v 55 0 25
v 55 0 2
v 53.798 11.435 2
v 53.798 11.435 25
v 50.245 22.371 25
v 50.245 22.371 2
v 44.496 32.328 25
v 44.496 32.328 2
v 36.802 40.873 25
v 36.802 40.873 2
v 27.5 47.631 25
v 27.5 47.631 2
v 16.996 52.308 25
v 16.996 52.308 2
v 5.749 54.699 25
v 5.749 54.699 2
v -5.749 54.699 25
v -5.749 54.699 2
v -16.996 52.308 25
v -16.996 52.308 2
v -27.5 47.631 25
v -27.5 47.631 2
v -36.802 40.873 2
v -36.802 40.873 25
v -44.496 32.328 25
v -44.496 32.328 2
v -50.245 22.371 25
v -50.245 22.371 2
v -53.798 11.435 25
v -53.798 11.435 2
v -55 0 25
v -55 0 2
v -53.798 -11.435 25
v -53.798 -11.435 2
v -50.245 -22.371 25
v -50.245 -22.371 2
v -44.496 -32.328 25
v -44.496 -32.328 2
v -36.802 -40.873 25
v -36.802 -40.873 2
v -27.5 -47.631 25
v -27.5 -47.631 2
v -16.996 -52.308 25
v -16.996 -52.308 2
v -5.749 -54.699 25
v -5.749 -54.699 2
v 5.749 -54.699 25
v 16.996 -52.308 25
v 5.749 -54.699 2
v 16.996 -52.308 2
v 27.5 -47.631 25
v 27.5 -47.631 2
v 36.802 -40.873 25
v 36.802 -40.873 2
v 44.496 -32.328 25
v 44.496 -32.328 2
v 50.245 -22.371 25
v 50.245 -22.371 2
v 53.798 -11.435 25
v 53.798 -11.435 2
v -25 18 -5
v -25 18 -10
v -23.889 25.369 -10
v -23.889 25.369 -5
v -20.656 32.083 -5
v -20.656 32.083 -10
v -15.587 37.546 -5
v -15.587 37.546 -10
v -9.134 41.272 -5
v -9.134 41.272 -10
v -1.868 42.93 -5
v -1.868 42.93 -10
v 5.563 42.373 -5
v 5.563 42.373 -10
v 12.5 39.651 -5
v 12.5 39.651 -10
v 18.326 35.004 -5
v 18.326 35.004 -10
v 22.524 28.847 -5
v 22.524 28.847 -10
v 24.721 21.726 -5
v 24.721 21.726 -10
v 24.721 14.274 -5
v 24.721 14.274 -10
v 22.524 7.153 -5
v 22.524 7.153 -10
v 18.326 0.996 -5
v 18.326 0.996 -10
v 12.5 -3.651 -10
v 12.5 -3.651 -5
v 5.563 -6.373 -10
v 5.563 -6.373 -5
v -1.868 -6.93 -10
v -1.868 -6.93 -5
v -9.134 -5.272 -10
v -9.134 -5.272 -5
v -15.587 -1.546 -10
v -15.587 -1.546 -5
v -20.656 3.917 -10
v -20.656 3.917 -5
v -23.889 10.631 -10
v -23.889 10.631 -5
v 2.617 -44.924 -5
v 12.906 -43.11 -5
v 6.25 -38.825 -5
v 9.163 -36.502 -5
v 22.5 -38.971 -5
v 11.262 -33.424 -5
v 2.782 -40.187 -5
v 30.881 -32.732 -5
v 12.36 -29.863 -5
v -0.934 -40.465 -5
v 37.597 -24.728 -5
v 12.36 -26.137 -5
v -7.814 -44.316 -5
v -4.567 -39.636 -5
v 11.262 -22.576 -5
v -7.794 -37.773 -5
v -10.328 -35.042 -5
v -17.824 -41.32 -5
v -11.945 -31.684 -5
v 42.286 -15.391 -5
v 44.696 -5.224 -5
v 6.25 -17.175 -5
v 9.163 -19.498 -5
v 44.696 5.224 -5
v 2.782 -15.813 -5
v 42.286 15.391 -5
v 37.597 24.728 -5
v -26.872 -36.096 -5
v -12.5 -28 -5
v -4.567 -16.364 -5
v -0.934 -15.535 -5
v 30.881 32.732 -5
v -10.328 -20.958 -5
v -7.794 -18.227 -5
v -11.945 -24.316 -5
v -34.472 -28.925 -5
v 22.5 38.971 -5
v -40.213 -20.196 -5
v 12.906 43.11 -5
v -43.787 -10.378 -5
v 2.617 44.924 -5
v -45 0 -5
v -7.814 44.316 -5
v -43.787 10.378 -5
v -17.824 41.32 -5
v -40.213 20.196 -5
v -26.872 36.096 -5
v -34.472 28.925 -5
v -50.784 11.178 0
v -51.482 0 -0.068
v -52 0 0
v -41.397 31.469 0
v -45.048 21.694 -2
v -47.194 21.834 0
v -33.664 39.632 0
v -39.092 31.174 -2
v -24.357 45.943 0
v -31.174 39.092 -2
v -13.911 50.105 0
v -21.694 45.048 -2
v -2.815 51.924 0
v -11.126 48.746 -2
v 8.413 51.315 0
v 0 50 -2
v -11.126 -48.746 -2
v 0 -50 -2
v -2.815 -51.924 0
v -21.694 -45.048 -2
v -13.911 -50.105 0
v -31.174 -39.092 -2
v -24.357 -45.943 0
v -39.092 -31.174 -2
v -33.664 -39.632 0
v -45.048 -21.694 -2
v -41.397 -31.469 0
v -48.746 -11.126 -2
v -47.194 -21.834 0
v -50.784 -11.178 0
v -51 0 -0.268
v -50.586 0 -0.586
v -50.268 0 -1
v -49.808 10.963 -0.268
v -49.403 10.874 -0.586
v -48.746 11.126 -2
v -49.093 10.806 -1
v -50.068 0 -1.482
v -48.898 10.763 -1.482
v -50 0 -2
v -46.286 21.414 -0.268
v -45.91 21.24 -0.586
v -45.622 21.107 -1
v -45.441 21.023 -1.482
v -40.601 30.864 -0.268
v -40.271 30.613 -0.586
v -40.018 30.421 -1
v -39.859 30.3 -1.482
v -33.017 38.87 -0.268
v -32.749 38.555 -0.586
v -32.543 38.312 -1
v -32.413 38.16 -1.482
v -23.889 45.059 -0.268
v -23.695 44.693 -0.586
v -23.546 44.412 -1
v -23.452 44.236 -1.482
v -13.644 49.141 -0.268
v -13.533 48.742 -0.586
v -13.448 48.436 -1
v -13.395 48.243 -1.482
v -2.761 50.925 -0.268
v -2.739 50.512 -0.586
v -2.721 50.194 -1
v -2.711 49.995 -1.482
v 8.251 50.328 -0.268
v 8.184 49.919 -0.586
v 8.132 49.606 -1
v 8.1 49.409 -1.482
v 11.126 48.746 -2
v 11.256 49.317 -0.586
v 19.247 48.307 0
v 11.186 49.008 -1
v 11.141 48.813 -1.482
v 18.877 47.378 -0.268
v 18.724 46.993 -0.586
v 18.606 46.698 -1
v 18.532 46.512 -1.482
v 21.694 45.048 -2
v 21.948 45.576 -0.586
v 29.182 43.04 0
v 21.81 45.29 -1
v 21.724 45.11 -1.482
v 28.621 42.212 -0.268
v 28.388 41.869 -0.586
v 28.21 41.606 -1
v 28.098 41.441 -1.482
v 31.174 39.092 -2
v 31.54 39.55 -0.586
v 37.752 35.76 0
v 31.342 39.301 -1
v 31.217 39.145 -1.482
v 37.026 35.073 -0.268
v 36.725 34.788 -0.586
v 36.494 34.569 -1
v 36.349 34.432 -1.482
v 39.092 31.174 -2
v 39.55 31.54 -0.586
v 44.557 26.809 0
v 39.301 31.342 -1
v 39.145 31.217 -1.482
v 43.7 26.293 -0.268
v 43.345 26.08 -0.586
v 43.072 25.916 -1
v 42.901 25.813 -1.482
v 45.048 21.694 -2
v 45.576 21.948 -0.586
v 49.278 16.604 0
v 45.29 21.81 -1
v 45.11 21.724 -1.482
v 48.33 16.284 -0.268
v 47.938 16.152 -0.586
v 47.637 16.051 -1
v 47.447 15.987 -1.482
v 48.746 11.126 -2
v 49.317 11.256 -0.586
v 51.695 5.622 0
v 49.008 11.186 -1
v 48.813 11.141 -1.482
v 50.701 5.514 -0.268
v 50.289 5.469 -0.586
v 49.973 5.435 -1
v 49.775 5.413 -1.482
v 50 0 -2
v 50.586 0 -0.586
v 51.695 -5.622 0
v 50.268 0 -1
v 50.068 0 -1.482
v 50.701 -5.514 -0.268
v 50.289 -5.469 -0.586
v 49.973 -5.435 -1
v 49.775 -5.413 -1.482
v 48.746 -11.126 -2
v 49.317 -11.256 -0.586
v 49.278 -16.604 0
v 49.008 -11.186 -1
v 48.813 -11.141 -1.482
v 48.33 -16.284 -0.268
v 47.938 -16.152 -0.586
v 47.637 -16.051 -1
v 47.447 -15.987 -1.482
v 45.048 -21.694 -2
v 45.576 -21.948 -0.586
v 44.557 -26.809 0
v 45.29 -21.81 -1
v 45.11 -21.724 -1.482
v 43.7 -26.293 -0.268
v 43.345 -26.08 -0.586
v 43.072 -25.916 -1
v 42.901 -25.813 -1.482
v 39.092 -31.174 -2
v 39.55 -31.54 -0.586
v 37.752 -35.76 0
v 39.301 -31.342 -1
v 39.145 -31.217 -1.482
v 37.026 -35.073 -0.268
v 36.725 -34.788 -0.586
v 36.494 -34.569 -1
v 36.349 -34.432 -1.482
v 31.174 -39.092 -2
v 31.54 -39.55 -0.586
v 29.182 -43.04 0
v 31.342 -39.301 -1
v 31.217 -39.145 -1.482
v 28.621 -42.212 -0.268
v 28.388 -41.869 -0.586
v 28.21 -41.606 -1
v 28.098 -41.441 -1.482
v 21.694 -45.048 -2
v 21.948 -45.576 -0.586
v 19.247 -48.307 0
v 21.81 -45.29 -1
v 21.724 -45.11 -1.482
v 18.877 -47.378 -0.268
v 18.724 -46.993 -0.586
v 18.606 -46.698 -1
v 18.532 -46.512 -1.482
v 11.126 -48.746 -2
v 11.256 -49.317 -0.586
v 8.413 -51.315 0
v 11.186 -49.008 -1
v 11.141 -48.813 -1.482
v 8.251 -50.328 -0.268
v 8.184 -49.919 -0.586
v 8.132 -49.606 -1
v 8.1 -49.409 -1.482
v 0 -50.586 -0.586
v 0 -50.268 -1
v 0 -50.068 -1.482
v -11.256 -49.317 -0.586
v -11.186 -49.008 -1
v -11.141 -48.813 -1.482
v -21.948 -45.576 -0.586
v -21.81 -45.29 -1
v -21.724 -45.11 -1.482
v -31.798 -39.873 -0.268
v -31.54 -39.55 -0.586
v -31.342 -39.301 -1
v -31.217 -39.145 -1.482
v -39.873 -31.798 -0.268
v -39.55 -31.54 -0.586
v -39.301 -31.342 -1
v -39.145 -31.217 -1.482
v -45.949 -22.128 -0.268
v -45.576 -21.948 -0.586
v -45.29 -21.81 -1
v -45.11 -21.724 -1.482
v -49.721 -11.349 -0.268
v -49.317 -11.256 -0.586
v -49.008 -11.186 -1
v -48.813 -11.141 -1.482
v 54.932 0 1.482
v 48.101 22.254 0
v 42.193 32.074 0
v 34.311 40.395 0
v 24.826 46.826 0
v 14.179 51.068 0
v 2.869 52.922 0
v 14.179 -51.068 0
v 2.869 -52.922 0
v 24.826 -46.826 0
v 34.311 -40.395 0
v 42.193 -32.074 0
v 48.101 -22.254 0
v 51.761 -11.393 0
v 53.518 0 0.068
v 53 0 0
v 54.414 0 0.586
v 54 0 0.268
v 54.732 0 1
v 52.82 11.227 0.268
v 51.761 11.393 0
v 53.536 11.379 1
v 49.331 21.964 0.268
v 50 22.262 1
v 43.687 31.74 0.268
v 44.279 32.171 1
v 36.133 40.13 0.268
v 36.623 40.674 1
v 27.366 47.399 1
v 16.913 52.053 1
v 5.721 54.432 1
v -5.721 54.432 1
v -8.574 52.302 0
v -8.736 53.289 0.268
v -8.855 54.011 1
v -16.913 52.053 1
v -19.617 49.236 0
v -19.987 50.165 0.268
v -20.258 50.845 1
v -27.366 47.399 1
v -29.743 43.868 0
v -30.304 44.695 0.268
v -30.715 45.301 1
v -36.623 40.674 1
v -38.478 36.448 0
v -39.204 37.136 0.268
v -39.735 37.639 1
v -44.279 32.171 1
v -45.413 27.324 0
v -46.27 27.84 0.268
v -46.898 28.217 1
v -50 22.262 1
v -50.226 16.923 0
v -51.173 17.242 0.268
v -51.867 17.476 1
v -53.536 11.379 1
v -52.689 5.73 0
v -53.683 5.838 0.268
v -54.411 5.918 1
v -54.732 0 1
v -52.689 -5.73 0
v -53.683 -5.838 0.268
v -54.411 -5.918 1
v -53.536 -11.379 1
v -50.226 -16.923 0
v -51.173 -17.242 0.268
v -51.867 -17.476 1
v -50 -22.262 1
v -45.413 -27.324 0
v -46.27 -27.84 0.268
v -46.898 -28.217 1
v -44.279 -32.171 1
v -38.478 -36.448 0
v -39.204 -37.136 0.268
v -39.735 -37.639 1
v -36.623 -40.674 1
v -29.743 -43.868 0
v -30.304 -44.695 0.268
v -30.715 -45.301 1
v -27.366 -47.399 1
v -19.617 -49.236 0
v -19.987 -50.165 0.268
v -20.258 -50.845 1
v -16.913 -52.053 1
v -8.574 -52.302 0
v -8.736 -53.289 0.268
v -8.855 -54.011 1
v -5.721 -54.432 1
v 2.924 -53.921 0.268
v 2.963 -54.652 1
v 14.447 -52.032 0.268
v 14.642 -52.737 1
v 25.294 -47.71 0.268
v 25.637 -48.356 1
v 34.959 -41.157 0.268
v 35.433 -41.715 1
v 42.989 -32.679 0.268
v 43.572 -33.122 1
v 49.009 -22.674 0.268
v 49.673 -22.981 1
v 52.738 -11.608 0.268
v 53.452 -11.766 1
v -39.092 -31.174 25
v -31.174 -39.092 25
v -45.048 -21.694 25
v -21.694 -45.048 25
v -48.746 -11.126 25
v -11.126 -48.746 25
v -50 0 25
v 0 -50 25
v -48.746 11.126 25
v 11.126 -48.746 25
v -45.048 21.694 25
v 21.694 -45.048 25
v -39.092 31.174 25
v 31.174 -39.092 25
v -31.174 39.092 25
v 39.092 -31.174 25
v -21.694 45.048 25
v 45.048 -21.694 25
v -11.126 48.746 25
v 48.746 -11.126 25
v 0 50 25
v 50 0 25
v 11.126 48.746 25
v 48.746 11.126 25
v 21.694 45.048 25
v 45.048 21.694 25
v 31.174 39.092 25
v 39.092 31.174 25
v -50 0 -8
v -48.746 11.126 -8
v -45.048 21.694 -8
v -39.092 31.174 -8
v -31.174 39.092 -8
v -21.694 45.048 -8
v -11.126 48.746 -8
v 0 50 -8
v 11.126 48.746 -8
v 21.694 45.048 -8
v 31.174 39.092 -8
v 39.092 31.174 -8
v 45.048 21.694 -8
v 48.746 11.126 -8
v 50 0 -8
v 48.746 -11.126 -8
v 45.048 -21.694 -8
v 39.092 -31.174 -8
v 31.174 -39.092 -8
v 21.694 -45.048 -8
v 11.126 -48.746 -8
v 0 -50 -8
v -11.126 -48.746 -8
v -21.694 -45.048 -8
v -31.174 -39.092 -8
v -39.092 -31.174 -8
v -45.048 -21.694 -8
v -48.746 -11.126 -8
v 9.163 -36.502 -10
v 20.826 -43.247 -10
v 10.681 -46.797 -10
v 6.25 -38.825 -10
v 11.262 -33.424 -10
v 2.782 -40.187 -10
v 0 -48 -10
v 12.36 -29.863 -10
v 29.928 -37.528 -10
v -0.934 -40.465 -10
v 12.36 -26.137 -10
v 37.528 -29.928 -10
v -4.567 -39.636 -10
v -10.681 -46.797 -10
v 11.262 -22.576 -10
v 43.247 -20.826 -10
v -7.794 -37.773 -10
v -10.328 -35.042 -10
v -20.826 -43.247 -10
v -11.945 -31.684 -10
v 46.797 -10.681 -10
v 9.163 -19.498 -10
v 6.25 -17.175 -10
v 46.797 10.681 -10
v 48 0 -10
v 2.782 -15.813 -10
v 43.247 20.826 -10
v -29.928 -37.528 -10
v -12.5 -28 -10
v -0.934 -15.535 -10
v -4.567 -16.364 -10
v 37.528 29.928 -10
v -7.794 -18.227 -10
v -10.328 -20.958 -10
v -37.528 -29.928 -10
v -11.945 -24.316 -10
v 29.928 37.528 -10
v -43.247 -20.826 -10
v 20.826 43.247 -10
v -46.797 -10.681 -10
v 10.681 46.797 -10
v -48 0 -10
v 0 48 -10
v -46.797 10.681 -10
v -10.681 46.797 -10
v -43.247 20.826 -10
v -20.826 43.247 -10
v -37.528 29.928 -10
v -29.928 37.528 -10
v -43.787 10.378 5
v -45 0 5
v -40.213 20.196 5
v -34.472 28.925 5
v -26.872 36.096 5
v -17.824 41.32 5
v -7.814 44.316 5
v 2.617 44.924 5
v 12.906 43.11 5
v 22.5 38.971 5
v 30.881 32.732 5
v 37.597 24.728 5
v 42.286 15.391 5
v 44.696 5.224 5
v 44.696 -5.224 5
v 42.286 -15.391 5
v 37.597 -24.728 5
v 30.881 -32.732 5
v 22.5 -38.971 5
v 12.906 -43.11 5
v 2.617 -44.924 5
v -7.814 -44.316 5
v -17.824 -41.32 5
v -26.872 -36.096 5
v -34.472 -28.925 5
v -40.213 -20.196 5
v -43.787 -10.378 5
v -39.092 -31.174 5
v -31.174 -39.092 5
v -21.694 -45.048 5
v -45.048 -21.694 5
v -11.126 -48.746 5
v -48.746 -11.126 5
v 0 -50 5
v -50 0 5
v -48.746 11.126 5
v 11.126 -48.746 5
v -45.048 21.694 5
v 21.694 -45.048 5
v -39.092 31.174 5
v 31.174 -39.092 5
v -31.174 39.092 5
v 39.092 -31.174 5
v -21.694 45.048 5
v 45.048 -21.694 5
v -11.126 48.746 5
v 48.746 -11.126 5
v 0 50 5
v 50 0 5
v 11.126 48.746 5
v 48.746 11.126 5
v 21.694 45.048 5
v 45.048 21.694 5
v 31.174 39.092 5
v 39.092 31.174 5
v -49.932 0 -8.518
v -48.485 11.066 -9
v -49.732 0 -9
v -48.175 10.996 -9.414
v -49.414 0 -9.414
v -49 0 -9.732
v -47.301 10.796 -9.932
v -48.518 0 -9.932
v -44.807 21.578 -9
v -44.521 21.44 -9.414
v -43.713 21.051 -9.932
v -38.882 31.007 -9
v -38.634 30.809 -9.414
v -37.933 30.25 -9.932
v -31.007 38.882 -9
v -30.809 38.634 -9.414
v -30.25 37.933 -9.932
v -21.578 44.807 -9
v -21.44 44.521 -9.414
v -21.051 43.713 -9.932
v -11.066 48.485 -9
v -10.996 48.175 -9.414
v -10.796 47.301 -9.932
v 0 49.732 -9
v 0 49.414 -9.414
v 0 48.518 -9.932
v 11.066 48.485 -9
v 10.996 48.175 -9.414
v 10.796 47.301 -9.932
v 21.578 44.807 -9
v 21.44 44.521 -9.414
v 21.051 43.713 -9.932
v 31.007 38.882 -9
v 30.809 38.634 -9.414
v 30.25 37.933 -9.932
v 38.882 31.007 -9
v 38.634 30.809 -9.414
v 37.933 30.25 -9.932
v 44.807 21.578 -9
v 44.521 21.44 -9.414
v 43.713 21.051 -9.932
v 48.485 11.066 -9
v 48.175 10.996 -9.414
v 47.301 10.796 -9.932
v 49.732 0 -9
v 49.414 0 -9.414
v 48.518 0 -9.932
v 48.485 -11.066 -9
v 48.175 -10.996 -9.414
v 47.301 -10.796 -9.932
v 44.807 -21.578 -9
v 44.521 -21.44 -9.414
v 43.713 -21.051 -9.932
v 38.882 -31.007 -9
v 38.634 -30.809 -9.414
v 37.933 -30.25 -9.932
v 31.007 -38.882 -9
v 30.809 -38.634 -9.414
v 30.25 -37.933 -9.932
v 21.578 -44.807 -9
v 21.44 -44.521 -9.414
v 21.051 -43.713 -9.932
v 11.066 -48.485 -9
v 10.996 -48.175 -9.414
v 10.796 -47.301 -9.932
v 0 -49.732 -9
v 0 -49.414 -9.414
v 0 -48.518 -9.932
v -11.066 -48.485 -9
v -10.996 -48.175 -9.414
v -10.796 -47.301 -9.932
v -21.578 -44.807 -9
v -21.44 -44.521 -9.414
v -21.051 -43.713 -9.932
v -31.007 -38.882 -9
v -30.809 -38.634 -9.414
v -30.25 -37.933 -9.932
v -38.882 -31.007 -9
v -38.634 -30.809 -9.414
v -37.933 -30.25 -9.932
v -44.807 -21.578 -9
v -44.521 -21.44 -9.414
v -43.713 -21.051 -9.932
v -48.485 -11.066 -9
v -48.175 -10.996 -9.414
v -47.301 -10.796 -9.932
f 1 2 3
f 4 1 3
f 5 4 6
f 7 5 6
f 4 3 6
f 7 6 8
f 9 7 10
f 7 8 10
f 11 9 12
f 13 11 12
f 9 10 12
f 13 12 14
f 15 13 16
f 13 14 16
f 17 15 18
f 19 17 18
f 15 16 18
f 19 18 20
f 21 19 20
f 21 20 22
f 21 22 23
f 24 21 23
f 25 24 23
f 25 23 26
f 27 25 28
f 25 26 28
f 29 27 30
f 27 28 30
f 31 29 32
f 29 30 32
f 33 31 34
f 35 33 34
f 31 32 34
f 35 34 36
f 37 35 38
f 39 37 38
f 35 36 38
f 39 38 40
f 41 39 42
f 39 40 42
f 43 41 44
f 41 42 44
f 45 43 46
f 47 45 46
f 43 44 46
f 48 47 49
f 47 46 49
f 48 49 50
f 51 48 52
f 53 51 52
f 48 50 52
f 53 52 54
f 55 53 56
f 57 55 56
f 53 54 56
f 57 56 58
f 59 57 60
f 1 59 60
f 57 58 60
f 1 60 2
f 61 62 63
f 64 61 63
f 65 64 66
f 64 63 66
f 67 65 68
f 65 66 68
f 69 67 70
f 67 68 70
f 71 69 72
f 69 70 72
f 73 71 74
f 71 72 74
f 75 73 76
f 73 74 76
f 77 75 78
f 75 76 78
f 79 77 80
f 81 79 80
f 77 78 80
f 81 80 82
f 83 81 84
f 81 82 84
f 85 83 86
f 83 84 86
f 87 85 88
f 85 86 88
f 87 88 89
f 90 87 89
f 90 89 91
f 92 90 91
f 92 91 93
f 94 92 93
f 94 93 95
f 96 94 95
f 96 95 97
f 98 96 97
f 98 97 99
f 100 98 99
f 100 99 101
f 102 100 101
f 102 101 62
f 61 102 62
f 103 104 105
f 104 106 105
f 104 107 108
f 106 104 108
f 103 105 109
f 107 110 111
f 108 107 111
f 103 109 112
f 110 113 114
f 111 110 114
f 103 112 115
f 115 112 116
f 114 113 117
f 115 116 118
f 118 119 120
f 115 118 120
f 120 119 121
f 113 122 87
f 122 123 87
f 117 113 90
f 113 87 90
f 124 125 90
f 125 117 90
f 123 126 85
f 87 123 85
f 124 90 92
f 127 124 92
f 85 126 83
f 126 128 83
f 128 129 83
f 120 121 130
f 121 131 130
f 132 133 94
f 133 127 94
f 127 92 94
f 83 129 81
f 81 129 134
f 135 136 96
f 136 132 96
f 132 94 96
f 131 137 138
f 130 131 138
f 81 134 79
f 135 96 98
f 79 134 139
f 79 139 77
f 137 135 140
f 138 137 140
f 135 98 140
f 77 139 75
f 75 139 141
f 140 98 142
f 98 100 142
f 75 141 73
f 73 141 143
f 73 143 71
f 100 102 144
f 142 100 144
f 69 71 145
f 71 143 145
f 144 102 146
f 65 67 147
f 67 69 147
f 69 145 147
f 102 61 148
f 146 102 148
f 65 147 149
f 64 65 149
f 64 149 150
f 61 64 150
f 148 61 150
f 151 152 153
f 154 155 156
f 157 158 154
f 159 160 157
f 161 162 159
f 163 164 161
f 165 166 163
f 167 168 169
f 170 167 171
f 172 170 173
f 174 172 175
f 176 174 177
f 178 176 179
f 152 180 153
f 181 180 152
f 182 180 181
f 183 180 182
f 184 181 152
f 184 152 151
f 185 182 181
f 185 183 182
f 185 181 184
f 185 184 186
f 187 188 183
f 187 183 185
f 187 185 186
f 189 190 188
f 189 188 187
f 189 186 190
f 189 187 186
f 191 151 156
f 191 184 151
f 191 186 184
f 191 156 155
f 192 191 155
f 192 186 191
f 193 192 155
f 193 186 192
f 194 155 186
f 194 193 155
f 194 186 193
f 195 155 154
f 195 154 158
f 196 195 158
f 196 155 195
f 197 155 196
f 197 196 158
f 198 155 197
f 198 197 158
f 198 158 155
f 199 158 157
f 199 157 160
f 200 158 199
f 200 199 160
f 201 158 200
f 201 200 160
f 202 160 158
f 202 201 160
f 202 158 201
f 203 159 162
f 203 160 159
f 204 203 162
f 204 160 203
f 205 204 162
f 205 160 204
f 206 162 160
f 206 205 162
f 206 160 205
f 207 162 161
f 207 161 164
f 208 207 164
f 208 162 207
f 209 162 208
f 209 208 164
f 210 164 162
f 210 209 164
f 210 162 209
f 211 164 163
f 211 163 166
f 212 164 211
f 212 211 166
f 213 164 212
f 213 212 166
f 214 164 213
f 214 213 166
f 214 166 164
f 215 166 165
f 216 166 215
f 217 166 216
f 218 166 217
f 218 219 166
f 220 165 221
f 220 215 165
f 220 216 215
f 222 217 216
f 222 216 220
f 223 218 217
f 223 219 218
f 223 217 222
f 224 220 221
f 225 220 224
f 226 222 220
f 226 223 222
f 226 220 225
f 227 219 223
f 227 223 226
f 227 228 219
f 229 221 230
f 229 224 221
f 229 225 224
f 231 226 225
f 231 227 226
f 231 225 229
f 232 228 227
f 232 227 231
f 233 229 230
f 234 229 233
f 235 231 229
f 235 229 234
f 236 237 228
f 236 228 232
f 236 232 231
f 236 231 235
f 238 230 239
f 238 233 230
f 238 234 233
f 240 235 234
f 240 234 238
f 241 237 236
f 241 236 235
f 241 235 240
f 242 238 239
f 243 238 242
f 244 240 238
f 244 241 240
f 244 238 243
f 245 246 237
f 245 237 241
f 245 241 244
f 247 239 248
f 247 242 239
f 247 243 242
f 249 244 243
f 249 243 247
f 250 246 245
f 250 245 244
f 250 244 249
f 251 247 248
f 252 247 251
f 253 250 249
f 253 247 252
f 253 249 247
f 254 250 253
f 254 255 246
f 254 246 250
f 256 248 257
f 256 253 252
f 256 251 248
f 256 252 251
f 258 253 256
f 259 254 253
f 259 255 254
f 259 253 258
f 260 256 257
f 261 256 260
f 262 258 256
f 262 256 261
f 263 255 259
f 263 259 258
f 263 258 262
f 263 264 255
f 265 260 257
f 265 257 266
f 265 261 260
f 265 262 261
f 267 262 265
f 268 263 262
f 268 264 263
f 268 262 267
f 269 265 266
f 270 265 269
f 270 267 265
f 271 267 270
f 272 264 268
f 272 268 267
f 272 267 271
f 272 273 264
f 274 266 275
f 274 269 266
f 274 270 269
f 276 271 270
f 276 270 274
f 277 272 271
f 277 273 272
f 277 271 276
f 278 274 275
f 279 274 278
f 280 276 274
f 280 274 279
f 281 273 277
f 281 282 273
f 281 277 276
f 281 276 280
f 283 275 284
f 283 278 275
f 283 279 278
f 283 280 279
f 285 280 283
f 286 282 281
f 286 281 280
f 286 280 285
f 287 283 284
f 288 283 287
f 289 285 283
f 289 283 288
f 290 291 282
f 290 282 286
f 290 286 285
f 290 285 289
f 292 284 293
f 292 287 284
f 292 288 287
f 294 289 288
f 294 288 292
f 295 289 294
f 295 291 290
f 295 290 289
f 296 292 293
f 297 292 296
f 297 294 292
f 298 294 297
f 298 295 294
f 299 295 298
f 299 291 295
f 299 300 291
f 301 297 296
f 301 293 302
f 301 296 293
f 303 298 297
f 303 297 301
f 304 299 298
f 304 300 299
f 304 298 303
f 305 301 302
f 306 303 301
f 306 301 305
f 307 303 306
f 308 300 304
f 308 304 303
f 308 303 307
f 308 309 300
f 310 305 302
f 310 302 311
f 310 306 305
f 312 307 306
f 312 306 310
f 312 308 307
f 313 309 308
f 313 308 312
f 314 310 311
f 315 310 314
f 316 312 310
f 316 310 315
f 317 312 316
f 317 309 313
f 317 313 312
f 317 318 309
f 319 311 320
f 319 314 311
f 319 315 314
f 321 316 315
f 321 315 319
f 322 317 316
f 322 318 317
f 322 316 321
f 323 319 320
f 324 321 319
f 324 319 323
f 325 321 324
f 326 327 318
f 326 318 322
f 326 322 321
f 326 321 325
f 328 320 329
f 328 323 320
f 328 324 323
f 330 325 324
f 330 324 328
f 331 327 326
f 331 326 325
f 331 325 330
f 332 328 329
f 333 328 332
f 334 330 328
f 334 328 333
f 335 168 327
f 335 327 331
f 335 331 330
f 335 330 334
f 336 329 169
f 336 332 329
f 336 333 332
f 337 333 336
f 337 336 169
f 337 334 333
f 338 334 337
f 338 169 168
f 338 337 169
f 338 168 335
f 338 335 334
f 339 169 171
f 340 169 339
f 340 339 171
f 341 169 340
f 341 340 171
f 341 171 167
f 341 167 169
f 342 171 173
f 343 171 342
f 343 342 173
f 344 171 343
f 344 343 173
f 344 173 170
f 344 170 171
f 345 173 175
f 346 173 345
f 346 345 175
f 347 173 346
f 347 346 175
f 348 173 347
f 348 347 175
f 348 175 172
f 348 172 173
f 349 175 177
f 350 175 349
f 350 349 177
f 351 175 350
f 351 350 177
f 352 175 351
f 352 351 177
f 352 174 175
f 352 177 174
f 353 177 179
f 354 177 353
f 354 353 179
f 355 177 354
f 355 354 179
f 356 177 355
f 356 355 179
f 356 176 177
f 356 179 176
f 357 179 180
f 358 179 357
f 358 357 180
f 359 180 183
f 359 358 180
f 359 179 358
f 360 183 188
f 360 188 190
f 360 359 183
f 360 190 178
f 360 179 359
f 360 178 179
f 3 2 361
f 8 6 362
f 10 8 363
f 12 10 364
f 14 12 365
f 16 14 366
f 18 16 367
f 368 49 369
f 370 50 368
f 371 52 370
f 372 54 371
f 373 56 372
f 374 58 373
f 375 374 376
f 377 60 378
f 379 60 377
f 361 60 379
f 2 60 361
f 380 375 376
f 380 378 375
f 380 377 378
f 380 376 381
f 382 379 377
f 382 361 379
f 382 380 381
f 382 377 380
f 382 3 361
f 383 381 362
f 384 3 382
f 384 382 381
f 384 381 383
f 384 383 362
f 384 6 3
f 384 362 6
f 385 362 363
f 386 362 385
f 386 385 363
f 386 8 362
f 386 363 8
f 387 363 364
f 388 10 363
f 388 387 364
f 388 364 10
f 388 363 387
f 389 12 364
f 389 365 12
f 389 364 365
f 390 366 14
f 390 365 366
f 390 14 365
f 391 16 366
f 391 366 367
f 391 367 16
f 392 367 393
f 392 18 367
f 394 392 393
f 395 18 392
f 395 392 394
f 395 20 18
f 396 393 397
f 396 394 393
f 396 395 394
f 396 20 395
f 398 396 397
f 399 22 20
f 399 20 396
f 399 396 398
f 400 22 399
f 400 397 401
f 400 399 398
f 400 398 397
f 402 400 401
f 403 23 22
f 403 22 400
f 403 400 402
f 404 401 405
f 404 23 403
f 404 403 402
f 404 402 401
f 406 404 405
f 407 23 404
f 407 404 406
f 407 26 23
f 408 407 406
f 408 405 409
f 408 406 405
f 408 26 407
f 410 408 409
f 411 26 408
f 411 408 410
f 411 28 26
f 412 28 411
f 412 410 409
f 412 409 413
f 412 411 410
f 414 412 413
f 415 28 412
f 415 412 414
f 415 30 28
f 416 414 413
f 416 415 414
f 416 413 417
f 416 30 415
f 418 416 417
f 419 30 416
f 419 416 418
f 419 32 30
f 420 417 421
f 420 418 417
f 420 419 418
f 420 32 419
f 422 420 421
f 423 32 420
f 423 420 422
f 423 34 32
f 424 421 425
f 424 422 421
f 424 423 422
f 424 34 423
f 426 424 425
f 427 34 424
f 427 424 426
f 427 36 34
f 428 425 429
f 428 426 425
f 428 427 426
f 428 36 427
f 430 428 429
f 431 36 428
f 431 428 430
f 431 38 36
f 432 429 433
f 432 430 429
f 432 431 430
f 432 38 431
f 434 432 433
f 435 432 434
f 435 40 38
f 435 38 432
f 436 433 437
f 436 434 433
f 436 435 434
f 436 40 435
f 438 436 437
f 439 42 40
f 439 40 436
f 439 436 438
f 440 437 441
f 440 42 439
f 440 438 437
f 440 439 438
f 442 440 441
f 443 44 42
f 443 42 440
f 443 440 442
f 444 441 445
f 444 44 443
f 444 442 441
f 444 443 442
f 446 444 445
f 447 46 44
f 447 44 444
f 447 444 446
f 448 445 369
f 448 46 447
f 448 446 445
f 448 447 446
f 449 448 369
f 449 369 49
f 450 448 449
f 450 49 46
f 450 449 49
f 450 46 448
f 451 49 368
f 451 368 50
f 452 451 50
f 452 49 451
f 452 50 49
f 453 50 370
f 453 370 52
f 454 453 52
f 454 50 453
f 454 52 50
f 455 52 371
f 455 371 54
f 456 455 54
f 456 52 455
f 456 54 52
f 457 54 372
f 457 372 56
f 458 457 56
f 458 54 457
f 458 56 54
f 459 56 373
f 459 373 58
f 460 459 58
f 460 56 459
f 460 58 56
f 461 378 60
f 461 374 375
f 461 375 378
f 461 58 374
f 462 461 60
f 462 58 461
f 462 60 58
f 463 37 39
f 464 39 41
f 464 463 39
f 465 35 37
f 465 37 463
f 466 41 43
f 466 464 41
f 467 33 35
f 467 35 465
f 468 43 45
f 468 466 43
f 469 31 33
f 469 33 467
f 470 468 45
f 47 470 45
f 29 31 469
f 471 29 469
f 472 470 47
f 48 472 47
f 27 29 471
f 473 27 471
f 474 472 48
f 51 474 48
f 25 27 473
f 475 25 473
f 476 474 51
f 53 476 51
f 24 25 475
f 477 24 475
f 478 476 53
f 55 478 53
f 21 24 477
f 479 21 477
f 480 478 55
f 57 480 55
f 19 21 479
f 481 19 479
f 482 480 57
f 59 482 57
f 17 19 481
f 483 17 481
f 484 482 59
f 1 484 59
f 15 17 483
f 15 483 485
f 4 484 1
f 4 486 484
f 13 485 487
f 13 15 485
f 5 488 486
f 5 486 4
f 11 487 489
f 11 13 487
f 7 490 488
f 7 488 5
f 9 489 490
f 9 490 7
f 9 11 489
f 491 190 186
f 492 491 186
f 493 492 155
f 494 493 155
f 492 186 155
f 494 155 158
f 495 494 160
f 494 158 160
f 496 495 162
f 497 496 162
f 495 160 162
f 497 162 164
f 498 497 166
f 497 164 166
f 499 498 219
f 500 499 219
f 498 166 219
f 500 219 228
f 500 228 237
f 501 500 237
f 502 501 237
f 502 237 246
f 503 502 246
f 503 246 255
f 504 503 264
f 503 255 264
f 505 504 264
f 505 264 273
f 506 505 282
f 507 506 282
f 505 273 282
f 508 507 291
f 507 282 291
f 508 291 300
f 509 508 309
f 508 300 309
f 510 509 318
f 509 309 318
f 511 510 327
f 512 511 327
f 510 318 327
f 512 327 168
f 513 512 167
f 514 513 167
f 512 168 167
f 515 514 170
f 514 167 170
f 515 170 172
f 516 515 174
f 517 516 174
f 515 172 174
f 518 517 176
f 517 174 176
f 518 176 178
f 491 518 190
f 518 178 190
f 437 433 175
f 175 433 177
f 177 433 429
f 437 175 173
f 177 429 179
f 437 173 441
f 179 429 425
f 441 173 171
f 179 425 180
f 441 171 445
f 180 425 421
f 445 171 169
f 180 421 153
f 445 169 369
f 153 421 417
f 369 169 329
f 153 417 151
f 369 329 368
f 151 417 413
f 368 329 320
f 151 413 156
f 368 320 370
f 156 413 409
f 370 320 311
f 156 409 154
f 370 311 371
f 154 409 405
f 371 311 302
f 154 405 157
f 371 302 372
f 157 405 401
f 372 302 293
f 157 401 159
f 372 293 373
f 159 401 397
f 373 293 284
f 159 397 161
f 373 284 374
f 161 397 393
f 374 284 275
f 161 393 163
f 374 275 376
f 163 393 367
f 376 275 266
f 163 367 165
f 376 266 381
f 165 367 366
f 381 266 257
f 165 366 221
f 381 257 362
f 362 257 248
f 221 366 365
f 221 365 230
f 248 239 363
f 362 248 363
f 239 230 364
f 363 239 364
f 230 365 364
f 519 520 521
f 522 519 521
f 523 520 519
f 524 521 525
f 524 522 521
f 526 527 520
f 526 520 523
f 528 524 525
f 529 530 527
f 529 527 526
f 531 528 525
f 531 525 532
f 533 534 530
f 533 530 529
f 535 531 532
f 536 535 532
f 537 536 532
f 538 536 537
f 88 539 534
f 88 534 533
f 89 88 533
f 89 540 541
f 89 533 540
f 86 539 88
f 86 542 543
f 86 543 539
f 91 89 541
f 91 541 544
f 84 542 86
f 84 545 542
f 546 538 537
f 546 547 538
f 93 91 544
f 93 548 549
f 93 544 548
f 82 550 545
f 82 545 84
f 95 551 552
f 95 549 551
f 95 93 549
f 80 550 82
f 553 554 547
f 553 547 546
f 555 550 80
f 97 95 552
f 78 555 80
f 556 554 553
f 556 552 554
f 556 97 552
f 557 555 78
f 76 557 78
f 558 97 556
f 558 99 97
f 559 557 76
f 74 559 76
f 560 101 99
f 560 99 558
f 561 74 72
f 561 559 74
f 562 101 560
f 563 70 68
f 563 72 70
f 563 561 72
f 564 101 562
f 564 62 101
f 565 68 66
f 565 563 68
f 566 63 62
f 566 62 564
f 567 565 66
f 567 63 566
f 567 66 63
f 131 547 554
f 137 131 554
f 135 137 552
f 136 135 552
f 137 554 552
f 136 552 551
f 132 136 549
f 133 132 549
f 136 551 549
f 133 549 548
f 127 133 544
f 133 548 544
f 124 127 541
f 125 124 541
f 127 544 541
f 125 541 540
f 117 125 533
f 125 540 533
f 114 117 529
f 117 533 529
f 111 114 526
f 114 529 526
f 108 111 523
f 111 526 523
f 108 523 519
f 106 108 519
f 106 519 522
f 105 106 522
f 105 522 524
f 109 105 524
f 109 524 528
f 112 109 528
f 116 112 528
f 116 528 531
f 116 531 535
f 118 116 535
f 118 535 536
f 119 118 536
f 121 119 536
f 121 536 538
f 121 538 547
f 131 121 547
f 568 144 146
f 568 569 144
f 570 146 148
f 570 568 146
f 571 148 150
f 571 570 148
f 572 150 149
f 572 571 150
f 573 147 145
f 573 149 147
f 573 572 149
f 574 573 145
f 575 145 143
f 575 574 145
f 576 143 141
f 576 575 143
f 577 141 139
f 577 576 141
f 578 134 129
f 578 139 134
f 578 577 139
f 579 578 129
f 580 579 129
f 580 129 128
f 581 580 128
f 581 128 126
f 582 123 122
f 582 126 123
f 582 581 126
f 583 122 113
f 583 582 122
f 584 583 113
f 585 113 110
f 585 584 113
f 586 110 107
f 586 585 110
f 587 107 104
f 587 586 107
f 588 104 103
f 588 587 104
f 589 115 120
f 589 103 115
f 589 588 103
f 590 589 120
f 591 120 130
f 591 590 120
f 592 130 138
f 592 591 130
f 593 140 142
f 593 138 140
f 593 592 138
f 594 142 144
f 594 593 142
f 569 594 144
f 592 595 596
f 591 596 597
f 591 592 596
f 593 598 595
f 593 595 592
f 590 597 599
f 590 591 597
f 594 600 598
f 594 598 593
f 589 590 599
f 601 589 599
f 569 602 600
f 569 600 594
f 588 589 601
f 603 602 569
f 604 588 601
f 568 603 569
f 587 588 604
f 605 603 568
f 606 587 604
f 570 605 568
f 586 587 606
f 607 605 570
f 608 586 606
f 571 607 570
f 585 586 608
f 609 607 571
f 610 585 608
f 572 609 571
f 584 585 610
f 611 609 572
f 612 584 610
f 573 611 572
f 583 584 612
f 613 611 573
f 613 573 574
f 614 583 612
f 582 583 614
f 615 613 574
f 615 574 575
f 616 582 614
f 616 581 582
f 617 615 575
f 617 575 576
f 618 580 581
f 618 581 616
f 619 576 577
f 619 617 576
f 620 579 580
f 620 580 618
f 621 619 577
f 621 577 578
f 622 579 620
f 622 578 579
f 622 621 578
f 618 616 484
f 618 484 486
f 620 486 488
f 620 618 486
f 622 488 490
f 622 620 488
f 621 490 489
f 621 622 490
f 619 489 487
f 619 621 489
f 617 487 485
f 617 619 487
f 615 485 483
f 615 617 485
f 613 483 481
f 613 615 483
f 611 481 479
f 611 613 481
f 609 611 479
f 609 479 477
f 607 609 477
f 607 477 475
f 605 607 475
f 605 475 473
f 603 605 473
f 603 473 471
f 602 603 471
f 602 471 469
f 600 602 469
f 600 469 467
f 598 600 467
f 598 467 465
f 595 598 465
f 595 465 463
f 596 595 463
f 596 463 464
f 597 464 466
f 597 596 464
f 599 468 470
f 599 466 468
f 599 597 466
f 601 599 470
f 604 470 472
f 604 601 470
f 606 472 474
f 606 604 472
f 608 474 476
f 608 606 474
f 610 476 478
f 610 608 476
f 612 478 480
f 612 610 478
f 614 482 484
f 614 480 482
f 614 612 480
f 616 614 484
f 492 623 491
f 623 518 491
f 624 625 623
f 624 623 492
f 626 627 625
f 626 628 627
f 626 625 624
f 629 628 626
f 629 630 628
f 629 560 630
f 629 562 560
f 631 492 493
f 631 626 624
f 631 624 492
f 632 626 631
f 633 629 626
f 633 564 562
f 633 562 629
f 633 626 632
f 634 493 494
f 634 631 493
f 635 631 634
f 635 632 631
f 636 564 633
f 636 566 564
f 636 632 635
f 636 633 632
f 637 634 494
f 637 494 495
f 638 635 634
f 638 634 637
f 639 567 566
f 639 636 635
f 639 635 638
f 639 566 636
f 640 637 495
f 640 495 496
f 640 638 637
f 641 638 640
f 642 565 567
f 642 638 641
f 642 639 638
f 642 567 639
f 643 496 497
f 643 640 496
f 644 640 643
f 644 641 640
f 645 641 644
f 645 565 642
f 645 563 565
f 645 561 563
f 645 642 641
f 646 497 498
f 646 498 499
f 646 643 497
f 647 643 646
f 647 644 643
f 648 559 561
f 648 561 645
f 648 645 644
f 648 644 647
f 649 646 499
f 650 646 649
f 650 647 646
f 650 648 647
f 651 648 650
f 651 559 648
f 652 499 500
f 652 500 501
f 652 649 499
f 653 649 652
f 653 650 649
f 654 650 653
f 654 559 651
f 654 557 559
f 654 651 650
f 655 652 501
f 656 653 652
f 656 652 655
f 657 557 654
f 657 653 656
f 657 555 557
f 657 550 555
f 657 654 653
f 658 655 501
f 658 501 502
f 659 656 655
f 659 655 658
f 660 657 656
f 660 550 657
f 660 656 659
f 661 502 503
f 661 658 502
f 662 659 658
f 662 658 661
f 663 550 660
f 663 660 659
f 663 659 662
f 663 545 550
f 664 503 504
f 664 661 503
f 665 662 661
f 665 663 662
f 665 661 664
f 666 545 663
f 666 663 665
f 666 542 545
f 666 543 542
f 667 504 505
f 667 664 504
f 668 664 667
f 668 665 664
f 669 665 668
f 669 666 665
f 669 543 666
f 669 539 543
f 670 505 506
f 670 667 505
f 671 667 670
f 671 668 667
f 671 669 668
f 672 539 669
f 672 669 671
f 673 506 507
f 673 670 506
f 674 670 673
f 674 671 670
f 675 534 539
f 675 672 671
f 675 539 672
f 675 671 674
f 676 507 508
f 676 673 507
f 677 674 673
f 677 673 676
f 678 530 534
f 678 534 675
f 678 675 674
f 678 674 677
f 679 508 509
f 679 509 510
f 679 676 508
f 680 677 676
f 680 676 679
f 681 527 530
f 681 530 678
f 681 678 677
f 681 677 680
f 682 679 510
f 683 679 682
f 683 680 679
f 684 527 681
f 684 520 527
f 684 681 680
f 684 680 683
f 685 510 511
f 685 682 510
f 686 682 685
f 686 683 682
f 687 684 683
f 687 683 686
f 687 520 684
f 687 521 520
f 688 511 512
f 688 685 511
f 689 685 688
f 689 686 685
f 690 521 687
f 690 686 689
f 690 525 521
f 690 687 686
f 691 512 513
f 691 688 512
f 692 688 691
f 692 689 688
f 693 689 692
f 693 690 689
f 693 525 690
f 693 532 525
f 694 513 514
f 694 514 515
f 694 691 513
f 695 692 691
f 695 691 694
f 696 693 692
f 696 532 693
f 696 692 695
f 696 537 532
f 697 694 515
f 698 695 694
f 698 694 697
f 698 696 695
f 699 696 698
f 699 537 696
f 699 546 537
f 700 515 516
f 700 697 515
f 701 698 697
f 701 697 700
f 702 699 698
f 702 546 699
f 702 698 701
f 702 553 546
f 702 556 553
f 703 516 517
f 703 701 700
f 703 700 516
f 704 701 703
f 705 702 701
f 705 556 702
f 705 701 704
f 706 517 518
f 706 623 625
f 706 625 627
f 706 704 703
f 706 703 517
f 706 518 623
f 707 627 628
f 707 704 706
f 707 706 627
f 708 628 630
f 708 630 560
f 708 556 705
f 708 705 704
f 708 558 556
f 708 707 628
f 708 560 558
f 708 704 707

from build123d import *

# Parameters (mm, degrees)
ESBO_O1_R                = 55
RESSALTO_EXTRUS_O1_DEPTH = 25
ESBO_O2_R                = 50
RESSALTO_EXTRUS_O2_DEPTH = 10
CASCA1_T                 = -5
FILETE2_R                = 2
FILETE3_R                = 2
ESBO_O3_R                = 25
ESBO_O3_R_2              = 12.5
CORTE_EXTRUS_O1_DEPTH    = 86.293610546


with BuildPart() as part:
    # Esboço1 → Ressalto-extrusão1 (new body)
    with BuildSketch(Plane.XY):
        Circle(ESBO_O1_R)
    extrude(amount=RESSALTO_EXTRUS_O1_DEPTH)

    # Esboço2 → Ressalto-extrusão2 (add)
    with BuildSketch(Plane(origin=(0, 0, 0), x_dir=(-1, 0, 0), z_dir=(0, 0, -1))):
        Circle(ESBO_O2_R)
    extrude(amount=RESSALTO_EXTRUS_O2_DEPTH)

    # Casca1
    casca1_openings = [part.faces().sort_by_distance(p)[0] for p in [
        (0, 0, 25),
    ]]
    offset(amount=CASCA1_T, openings=casca1_openings, kind=Kind.INTERSECTION)

    # Filete2
    filete2_edges = [part.edges().sort_by_distance(p)[0] for p in [
        (50, 0, 0),
        (50, 0, -10),
    ]]
    fillet(filete2_edges, radius=FILETE2_R)

    # Filete3
    filete3_edges = [part.edges().sort_by_distance(p)[0] for p in [
        (-55, 0, 0),
    ]]
    fillet(filete3_edges, radius=FILETE3_R)

    # Esboço3 → Corte-extrusão1 (cut, through all)
    with BuildSketch(Plane(origin=(0, 0, -10), x_dir=(-1, 0, 0), z_dir=(0, 0, -1))):
        with Locations((0, 18)):
            Circle(ESBO_O3_R)
        with Locations((0, -28)):
            Circle(ESBO_O3_R_2)
    extrude(amount=-CORTE_EXTRUS_O1_DEPTH, mode=Mode.SUBTRACT)


solid = part.part
